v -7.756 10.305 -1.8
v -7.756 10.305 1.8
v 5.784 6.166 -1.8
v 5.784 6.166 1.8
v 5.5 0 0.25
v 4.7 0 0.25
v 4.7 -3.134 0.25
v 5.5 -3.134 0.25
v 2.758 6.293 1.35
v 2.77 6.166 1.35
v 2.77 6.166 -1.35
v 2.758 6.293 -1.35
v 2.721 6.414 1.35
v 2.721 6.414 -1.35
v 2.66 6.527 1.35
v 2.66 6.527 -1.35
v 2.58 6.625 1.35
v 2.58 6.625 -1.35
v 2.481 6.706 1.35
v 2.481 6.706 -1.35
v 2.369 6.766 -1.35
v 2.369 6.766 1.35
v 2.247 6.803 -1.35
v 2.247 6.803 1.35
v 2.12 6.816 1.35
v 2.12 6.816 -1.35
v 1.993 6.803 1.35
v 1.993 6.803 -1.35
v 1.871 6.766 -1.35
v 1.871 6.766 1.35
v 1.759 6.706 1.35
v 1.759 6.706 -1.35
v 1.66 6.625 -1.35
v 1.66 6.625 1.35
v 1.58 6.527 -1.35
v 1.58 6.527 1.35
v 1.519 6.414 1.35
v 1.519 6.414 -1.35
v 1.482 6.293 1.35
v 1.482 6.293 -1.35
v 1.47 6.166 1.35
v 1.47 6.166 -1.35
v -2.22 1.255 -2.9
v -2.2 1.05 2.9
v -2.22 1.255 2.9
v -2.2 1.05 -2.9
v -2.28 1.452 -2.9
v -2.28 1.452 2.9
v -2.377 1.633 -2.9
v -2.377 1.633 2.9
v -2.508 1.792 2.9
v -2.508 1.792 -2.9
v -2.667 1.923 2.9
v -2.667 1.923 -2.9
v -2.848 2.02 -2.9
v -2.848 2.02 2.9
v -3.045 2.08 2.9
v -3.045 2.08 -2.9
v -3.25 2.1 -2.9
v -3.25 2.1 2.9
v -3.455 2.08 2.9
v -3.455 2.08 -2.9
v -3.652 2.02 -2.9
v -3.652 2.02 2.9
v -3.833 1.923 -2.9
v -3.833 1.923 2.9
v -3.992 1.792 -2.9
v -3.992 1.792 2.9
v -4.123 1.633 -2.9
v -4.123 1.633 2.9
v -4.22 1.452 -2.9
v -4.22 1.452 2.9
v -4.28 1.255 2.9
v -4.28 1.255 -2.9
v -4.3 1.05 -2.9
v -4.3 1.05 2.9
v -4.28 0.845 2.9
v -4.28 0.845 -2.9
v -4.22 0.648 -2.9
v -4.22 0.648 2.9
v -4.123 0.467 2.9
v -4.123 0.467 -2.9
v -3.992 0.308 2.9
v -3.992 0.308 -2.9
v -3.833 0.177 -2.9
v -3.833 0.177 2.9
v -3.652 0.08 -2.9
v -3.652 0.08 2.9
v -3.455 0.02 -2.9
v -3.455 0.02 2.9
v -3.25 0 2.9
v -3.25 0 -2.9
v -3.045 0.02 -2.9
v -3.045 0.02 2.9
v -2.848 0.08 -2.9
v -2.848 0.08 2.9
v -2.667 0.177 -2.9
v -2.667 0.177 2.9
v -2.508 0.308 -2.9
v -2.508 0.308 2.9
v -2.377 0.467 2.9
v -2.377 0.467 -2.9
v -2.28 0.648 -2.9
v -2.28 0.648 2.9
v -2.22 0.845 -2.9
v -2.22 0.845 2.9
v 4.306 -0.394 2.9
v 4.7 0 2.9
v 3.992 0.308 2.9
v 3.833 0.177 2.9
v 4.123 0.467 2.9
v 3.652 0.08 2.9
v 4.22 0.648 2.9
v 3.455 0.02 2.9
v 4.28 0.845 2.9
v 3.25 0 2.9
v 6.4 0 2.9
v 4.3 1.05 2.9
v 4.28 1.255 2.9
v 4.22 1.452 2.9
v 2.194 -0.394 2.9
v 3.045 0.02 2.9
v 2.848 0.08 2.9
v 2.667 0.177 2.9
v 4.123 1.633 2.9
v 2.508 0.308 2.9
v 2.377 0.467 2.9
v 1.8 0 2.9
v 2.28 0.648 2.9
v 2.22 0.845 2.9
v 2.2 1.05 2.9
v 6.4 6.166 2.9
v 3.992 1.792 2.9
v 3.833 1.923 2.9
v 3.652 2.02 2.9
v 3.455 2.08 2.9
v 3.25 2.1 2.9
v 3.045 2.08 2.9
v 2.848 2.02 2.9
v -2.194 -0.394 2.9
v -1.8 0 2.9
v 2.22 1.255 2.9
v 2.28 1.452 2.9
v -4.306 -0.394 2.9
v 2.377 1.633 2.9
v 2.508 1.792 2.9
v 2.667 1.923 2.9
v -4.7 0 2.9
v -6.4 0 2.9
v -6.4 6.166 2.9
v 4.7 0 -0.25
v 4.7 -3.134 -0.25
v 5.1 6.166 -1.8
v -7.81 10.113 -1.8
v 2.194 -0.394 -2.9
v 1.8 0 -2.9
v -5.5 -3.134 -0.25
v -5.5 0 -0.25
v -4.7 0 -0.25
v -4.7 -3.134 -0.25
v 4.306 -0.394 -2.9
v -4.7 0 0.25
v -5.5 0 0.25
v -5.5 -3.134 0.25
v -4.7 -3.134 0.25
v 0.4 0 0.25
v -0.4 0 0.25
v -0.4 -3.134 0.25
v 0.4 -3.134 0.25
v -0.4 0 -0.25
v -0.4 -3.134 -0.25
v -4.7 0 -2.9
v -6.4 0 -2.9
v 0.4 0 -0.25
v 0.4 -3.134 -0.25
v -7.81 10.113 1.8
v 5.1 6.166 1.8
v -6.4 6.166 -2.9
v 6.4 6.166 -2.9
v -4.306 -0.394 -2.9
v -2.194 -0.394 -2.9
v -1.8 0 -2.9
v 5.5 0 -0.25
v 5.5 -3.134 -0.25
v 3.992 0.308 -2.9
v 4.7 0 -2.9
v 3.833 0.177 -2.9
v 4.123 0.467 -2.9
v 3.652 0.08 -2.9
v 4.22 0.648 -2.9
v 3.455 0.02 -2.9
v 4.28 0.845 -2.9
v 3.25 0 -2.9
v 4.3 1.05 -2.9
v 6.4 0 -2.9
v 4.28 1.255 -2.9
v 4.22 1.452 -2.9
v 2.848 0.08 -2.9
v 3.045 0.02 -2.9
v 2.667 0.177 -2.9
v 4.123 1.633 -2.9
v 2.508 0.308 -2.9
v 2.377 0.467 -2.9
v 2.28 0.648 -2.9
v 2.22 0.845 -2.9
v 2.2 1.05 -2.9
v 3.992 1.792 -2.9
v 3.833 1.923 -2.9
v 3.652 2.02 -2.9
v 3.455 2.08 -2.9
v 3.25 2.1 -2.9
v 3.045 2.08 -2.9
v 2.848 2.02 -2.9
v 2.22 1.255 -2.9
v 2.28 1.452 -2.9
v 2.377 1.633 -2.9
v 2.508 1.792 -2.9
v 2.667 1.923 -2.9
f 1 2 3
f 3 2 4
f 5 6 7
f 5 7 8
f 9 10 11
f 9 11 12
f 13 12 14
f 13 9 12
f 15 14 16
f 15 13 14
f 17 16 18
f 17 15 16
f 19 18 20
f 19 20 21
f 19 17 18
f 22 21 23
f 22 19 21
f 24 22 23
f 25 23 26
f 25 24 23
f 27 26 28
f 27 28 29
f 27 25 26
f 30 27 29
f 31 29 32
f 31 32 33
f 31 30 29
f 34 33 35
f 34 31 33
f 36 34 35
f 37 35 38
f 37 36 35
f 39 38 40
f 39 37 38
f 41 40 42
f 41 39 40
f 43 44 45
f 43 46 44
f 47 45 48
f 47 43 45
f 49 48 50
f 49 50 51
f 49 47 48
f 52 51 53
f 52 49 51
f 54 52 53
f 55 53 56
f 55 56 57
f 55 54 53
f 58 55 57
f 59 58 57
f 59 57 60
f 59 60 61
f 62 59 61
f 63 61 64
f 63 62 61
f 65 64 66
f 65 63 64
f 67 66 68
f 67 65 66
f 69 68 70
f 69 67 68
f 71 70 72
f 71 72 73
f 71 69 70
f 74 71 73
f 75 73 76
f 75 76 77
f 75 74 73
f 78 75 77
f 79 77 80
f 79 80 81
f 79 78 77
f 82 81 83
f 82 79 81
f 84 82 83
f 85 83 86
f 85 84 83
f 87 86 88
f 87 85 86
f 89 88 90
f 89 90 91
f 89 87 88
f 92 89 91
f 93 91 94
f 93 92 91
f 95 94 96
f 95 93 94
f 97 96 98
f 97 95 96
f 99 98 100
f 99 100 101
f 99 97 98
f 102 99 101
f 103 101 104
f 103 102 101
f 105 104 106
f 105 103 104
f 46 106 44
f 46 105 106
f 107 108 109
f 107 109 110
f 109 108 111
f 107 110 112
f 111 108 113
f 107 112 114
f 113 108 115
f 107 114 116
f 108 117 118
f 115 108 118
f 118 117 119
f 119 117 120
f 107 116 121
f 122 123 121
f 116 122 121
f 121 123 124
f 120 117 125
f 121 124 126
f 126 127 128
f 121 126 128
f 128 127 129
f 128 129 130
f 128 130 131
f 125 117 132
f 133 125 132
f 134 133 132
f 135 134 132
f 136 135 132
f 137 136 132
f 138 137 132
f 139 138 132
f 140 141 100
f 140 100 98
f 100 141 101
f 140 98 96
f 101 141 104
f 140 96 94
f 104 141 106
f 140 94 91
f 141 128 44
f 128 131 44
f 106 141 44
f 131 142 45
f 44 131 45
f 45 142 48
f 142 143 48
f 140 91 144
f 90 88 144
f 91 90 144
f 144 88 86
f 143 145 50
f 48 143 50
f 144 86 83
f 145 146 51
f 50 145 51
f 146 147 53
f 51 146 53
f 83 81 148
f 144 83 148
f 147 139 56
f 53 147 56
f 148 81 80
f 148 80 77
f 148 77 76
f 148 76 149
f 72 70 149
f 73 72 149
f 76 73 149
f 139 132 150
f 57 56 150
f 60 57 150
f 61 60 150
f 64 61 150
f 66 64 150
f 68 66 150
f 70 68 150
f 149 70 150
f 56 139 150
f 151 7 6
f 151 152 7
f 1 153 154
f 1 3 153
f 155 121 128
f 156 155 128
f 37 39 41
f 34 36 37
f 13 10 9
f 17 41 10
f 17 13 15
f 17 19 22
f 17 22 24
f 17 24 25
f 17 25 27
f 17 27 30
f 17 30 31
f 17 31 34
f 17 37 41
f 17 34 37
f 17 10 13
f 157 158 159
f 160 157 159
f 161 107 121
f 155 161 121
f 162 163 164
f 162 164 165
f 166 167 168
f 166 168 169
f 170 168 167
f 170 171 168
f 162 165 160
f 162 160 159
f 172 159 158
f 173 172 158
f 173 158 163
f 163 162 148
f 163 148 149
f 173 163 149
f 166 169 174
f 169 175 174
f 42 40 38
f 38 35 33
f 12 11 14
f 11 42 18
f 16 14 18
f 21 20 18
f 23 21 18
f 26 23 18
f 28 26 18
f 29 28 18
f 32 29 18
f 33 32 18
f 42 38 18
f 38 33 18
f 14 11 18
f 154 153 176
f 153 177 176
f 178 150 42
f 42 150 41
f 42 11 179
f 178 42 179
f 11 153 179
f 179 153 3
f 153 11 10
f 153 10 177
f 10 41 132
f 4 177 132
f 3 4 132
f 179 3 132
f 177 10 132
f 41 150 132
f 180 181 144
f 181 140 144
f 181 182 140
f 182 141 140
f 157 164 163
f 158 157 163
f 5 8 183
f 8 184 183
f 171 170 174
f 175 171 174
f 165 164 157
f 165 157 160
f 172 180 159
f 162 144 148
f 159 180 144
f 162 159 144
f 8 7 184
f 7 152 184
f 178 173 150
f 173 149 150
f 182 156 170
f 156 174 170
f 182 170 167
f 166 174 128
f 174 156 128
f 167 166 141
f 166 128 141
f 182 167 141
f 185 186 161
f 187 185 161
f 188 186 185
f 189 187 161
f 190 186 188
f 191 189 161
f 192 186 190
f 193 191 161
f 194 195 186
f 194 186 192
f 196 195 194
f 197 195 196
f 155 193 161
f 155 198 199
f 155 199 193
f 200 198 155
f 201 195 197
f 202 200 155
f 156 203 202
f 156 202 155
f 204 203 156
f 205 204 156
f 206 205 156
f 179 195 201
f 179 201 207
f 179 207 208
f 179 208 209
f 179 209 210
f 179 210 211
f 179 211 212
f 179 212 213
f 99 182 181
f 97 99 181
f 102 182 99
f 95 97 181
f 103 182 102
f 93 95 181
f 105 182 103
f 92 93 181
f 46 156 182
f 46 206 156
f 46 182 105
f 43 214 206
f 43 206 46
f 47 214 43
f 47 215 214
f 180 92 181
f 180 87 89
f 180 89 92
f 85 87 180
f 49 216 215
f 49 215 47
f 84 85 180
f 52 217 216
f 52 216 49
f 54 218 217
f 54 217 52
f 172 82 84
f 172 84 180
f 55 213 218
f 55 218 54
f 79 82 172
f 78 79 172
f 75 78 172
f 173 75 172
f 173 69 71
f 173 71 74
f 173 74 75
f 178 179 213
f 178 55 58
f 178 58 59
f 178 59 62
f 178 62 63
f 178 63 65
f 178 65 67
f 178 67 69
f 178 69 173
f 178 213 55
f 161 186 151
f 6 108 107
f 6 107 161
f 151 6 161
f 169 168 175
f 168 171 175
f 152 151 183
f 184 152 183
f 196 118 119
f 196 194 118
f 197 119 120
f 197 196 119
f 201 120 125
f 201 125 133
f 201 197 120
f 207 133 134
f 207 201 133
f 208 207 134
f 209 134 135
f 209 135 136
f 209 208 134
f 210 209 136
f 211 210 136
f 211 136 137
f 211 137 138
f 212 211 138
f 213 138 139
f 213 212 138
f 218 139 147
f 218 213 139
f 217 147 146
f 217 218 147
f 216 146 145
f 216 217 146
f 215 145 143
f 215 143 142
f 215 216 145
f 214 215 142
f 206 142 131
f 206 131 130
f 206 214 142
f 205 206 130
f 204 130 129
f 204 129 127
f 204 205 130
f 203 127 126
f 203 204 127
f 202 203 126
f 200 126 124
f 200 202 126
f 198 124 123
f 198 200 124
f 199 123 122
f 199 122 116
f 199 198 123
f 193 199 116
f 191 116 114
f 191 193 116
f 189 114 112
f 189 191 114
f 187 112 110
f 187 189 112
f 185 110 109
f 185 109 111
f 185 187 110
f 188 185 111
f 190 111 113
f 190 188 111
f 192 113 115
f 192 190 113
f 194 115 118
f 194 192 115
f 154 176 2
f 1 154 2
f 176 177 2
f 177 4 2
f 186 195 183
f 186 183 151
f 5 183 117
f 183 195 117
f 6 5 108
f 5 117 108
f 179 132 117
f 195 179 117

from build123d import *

# Parameters (mm, degrees)
SKETCH_1_R      = 1.05
EXTRUDE_1_DEPTH = 2.9
EXTRUDE_2_DEPTH = 1.35
SKETCH_3_W      = 0.8
SKETCH_3_H      = 3.134296818
EXTRUDE_3_DEPTH = 0.25
EXTRUDE_4_DEPTH = 1.8


with BuildPart() as part:
    # 草图1 → 凸台-拉伸1 (new, symmetric)
    with BuildSketch(Plane.XY):
        Polygon((1.8, 0), (-1.8, 0), (-2.194296818, -0.394296818), (-4.305703182, -0.394296818), (-4.7, 0), (-6.4, 0), (-6.4, 6.165703182), (6.4, 6.165703182), (6.4, 0), (4.7, 0), (4.305703182, -0.394296818), (2.194296818, -0.394296818), align=None)
        with Locations((-3.25, 1.05)):
            Circle(SKETCH_1_R, mode=Mode.SUBTRACT)
        with Locations((3.25, 1.05)):
            Circle(SKETCH_1_R, mode=Mode.SUBTRACT)
    extrude(amount=EXTRUDE_1_DEPTH, both=True)

    # 草图2 → 凸台-拉伸2 (add, symmetric)
    with BuildSketch(Plane.XY):
        with BuildLine():
            Line((1.47, 6.165703182), (2.77, 6.165703182))
            ThreePointArc((2.77, 6.165703182), (2.12, 6.815703182), (1.47, 6.165703182))
        make_face()
    extrude(amount=EXTRUDE_2_DEPTH, both=True)

    # 草图3 → 凸台-拉伸3 (add, symmetric)
    with BuildSketch(Plane.XY):
        with Locations((5.1, -1.567148409)):
            Rectangle(SKETCH_3_W, SKETCH_3_H)
        with Locations((0, -1.567148409)):
            Rectangle(SKETCH_3_W, SKETCH_3_H)
        with Locations((-5.1, -1.567148409)):
            Rectangle(SKETCH_3_W, SKETCH_3_H)
    extrude(amount=EXTRUDE_3_DEPTH, both=True)

    # 草图4 → 凸台-拉伸4 (add, symmetric)
    with BuildSketch(Plane.XY):
        Polygon((-7.755801096, 10.305254362), (5.784060724, 6.165703182), (5.1, 6.165703182), (-7.810114206, 10.112721195), align=None)
    extrude(amount=EXTRUDE_4_DEPTH, both=True)


solid = part.part
